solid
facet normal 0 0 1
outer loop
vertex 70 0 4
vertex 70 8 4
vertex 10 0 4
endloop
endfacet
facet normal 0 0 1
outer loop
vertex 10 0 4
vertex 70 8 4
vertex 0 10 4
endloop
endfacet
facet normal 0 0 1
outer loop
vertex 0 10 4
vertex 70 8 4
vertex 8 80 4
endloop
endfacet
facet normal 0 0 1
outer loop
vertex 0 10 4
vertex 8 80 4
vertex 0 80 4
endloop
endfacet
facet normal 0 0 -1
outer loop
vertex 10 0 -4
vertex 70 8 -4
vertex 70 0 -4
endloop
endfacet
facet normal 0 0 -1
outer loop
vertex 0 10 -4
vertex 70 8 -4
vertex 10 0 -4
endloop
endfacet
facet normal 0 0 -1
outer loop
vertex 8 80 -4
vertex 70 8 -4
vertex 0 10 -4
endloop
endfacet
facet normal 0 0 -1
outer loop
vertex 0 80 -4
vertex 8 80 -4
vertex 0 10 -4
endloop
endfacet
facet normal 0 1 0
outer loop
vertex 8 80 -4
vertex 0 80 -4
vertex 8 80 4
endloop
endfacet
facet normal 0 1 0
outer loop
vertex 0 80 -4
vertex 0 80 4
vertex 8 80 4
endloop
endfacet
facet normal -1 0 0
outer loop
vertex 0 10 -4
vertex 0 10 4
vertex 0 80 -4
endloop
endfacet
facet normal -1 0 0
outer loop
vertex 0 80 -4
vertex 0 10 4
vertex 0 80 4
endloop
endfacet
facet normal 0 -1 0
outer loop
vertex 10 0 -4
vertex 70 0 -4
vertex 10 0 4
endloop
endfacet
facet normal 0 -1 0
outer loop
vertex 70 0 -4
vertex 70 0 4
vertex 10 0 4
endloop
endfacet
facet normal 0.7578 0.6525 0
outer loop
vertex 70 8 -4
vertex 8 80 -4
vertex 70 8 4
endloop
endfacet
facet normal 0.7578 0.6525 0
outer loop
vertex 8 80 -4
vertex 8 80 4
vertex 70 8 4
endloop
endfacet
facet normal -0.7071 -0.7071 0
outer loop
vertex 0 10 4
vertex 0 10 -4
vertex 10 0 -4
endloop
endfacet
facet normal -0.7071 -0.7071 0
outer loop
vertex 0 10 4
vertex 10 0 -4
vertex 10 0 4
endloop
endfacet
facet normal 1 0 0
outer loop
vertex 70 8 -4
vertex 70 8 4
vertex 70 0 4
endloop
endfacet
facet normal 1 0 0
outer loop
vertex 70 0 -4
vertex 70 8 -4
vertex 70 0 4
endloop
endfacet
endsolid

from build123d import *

# Parameters (mm, degrees)
EXTRUDE_1_DEPTH = 4
CHAMFER_1_SIZE  = 10


with BuildPart() as part:
    # Эскиз1 → Бобышка-Вытянуть1 (new, symmetric)
    with BuildSketch(Plane.XY):
        Polygon((0, 0), (0, 80), (8, 80), (70, 8), (70, 0), align=None)
    extrude(amount=EXTRUDE_1_DEPTH, both=True)

    # Фаска1
    chamfer_1_edges = [part.edges().sort_by_distance(p)[0] for p in [
        (0, 0, 0),
    ]]
    chamfer(chamfer_1_edges, length=CHAMFER_1_SIZE)


solid = part.part
